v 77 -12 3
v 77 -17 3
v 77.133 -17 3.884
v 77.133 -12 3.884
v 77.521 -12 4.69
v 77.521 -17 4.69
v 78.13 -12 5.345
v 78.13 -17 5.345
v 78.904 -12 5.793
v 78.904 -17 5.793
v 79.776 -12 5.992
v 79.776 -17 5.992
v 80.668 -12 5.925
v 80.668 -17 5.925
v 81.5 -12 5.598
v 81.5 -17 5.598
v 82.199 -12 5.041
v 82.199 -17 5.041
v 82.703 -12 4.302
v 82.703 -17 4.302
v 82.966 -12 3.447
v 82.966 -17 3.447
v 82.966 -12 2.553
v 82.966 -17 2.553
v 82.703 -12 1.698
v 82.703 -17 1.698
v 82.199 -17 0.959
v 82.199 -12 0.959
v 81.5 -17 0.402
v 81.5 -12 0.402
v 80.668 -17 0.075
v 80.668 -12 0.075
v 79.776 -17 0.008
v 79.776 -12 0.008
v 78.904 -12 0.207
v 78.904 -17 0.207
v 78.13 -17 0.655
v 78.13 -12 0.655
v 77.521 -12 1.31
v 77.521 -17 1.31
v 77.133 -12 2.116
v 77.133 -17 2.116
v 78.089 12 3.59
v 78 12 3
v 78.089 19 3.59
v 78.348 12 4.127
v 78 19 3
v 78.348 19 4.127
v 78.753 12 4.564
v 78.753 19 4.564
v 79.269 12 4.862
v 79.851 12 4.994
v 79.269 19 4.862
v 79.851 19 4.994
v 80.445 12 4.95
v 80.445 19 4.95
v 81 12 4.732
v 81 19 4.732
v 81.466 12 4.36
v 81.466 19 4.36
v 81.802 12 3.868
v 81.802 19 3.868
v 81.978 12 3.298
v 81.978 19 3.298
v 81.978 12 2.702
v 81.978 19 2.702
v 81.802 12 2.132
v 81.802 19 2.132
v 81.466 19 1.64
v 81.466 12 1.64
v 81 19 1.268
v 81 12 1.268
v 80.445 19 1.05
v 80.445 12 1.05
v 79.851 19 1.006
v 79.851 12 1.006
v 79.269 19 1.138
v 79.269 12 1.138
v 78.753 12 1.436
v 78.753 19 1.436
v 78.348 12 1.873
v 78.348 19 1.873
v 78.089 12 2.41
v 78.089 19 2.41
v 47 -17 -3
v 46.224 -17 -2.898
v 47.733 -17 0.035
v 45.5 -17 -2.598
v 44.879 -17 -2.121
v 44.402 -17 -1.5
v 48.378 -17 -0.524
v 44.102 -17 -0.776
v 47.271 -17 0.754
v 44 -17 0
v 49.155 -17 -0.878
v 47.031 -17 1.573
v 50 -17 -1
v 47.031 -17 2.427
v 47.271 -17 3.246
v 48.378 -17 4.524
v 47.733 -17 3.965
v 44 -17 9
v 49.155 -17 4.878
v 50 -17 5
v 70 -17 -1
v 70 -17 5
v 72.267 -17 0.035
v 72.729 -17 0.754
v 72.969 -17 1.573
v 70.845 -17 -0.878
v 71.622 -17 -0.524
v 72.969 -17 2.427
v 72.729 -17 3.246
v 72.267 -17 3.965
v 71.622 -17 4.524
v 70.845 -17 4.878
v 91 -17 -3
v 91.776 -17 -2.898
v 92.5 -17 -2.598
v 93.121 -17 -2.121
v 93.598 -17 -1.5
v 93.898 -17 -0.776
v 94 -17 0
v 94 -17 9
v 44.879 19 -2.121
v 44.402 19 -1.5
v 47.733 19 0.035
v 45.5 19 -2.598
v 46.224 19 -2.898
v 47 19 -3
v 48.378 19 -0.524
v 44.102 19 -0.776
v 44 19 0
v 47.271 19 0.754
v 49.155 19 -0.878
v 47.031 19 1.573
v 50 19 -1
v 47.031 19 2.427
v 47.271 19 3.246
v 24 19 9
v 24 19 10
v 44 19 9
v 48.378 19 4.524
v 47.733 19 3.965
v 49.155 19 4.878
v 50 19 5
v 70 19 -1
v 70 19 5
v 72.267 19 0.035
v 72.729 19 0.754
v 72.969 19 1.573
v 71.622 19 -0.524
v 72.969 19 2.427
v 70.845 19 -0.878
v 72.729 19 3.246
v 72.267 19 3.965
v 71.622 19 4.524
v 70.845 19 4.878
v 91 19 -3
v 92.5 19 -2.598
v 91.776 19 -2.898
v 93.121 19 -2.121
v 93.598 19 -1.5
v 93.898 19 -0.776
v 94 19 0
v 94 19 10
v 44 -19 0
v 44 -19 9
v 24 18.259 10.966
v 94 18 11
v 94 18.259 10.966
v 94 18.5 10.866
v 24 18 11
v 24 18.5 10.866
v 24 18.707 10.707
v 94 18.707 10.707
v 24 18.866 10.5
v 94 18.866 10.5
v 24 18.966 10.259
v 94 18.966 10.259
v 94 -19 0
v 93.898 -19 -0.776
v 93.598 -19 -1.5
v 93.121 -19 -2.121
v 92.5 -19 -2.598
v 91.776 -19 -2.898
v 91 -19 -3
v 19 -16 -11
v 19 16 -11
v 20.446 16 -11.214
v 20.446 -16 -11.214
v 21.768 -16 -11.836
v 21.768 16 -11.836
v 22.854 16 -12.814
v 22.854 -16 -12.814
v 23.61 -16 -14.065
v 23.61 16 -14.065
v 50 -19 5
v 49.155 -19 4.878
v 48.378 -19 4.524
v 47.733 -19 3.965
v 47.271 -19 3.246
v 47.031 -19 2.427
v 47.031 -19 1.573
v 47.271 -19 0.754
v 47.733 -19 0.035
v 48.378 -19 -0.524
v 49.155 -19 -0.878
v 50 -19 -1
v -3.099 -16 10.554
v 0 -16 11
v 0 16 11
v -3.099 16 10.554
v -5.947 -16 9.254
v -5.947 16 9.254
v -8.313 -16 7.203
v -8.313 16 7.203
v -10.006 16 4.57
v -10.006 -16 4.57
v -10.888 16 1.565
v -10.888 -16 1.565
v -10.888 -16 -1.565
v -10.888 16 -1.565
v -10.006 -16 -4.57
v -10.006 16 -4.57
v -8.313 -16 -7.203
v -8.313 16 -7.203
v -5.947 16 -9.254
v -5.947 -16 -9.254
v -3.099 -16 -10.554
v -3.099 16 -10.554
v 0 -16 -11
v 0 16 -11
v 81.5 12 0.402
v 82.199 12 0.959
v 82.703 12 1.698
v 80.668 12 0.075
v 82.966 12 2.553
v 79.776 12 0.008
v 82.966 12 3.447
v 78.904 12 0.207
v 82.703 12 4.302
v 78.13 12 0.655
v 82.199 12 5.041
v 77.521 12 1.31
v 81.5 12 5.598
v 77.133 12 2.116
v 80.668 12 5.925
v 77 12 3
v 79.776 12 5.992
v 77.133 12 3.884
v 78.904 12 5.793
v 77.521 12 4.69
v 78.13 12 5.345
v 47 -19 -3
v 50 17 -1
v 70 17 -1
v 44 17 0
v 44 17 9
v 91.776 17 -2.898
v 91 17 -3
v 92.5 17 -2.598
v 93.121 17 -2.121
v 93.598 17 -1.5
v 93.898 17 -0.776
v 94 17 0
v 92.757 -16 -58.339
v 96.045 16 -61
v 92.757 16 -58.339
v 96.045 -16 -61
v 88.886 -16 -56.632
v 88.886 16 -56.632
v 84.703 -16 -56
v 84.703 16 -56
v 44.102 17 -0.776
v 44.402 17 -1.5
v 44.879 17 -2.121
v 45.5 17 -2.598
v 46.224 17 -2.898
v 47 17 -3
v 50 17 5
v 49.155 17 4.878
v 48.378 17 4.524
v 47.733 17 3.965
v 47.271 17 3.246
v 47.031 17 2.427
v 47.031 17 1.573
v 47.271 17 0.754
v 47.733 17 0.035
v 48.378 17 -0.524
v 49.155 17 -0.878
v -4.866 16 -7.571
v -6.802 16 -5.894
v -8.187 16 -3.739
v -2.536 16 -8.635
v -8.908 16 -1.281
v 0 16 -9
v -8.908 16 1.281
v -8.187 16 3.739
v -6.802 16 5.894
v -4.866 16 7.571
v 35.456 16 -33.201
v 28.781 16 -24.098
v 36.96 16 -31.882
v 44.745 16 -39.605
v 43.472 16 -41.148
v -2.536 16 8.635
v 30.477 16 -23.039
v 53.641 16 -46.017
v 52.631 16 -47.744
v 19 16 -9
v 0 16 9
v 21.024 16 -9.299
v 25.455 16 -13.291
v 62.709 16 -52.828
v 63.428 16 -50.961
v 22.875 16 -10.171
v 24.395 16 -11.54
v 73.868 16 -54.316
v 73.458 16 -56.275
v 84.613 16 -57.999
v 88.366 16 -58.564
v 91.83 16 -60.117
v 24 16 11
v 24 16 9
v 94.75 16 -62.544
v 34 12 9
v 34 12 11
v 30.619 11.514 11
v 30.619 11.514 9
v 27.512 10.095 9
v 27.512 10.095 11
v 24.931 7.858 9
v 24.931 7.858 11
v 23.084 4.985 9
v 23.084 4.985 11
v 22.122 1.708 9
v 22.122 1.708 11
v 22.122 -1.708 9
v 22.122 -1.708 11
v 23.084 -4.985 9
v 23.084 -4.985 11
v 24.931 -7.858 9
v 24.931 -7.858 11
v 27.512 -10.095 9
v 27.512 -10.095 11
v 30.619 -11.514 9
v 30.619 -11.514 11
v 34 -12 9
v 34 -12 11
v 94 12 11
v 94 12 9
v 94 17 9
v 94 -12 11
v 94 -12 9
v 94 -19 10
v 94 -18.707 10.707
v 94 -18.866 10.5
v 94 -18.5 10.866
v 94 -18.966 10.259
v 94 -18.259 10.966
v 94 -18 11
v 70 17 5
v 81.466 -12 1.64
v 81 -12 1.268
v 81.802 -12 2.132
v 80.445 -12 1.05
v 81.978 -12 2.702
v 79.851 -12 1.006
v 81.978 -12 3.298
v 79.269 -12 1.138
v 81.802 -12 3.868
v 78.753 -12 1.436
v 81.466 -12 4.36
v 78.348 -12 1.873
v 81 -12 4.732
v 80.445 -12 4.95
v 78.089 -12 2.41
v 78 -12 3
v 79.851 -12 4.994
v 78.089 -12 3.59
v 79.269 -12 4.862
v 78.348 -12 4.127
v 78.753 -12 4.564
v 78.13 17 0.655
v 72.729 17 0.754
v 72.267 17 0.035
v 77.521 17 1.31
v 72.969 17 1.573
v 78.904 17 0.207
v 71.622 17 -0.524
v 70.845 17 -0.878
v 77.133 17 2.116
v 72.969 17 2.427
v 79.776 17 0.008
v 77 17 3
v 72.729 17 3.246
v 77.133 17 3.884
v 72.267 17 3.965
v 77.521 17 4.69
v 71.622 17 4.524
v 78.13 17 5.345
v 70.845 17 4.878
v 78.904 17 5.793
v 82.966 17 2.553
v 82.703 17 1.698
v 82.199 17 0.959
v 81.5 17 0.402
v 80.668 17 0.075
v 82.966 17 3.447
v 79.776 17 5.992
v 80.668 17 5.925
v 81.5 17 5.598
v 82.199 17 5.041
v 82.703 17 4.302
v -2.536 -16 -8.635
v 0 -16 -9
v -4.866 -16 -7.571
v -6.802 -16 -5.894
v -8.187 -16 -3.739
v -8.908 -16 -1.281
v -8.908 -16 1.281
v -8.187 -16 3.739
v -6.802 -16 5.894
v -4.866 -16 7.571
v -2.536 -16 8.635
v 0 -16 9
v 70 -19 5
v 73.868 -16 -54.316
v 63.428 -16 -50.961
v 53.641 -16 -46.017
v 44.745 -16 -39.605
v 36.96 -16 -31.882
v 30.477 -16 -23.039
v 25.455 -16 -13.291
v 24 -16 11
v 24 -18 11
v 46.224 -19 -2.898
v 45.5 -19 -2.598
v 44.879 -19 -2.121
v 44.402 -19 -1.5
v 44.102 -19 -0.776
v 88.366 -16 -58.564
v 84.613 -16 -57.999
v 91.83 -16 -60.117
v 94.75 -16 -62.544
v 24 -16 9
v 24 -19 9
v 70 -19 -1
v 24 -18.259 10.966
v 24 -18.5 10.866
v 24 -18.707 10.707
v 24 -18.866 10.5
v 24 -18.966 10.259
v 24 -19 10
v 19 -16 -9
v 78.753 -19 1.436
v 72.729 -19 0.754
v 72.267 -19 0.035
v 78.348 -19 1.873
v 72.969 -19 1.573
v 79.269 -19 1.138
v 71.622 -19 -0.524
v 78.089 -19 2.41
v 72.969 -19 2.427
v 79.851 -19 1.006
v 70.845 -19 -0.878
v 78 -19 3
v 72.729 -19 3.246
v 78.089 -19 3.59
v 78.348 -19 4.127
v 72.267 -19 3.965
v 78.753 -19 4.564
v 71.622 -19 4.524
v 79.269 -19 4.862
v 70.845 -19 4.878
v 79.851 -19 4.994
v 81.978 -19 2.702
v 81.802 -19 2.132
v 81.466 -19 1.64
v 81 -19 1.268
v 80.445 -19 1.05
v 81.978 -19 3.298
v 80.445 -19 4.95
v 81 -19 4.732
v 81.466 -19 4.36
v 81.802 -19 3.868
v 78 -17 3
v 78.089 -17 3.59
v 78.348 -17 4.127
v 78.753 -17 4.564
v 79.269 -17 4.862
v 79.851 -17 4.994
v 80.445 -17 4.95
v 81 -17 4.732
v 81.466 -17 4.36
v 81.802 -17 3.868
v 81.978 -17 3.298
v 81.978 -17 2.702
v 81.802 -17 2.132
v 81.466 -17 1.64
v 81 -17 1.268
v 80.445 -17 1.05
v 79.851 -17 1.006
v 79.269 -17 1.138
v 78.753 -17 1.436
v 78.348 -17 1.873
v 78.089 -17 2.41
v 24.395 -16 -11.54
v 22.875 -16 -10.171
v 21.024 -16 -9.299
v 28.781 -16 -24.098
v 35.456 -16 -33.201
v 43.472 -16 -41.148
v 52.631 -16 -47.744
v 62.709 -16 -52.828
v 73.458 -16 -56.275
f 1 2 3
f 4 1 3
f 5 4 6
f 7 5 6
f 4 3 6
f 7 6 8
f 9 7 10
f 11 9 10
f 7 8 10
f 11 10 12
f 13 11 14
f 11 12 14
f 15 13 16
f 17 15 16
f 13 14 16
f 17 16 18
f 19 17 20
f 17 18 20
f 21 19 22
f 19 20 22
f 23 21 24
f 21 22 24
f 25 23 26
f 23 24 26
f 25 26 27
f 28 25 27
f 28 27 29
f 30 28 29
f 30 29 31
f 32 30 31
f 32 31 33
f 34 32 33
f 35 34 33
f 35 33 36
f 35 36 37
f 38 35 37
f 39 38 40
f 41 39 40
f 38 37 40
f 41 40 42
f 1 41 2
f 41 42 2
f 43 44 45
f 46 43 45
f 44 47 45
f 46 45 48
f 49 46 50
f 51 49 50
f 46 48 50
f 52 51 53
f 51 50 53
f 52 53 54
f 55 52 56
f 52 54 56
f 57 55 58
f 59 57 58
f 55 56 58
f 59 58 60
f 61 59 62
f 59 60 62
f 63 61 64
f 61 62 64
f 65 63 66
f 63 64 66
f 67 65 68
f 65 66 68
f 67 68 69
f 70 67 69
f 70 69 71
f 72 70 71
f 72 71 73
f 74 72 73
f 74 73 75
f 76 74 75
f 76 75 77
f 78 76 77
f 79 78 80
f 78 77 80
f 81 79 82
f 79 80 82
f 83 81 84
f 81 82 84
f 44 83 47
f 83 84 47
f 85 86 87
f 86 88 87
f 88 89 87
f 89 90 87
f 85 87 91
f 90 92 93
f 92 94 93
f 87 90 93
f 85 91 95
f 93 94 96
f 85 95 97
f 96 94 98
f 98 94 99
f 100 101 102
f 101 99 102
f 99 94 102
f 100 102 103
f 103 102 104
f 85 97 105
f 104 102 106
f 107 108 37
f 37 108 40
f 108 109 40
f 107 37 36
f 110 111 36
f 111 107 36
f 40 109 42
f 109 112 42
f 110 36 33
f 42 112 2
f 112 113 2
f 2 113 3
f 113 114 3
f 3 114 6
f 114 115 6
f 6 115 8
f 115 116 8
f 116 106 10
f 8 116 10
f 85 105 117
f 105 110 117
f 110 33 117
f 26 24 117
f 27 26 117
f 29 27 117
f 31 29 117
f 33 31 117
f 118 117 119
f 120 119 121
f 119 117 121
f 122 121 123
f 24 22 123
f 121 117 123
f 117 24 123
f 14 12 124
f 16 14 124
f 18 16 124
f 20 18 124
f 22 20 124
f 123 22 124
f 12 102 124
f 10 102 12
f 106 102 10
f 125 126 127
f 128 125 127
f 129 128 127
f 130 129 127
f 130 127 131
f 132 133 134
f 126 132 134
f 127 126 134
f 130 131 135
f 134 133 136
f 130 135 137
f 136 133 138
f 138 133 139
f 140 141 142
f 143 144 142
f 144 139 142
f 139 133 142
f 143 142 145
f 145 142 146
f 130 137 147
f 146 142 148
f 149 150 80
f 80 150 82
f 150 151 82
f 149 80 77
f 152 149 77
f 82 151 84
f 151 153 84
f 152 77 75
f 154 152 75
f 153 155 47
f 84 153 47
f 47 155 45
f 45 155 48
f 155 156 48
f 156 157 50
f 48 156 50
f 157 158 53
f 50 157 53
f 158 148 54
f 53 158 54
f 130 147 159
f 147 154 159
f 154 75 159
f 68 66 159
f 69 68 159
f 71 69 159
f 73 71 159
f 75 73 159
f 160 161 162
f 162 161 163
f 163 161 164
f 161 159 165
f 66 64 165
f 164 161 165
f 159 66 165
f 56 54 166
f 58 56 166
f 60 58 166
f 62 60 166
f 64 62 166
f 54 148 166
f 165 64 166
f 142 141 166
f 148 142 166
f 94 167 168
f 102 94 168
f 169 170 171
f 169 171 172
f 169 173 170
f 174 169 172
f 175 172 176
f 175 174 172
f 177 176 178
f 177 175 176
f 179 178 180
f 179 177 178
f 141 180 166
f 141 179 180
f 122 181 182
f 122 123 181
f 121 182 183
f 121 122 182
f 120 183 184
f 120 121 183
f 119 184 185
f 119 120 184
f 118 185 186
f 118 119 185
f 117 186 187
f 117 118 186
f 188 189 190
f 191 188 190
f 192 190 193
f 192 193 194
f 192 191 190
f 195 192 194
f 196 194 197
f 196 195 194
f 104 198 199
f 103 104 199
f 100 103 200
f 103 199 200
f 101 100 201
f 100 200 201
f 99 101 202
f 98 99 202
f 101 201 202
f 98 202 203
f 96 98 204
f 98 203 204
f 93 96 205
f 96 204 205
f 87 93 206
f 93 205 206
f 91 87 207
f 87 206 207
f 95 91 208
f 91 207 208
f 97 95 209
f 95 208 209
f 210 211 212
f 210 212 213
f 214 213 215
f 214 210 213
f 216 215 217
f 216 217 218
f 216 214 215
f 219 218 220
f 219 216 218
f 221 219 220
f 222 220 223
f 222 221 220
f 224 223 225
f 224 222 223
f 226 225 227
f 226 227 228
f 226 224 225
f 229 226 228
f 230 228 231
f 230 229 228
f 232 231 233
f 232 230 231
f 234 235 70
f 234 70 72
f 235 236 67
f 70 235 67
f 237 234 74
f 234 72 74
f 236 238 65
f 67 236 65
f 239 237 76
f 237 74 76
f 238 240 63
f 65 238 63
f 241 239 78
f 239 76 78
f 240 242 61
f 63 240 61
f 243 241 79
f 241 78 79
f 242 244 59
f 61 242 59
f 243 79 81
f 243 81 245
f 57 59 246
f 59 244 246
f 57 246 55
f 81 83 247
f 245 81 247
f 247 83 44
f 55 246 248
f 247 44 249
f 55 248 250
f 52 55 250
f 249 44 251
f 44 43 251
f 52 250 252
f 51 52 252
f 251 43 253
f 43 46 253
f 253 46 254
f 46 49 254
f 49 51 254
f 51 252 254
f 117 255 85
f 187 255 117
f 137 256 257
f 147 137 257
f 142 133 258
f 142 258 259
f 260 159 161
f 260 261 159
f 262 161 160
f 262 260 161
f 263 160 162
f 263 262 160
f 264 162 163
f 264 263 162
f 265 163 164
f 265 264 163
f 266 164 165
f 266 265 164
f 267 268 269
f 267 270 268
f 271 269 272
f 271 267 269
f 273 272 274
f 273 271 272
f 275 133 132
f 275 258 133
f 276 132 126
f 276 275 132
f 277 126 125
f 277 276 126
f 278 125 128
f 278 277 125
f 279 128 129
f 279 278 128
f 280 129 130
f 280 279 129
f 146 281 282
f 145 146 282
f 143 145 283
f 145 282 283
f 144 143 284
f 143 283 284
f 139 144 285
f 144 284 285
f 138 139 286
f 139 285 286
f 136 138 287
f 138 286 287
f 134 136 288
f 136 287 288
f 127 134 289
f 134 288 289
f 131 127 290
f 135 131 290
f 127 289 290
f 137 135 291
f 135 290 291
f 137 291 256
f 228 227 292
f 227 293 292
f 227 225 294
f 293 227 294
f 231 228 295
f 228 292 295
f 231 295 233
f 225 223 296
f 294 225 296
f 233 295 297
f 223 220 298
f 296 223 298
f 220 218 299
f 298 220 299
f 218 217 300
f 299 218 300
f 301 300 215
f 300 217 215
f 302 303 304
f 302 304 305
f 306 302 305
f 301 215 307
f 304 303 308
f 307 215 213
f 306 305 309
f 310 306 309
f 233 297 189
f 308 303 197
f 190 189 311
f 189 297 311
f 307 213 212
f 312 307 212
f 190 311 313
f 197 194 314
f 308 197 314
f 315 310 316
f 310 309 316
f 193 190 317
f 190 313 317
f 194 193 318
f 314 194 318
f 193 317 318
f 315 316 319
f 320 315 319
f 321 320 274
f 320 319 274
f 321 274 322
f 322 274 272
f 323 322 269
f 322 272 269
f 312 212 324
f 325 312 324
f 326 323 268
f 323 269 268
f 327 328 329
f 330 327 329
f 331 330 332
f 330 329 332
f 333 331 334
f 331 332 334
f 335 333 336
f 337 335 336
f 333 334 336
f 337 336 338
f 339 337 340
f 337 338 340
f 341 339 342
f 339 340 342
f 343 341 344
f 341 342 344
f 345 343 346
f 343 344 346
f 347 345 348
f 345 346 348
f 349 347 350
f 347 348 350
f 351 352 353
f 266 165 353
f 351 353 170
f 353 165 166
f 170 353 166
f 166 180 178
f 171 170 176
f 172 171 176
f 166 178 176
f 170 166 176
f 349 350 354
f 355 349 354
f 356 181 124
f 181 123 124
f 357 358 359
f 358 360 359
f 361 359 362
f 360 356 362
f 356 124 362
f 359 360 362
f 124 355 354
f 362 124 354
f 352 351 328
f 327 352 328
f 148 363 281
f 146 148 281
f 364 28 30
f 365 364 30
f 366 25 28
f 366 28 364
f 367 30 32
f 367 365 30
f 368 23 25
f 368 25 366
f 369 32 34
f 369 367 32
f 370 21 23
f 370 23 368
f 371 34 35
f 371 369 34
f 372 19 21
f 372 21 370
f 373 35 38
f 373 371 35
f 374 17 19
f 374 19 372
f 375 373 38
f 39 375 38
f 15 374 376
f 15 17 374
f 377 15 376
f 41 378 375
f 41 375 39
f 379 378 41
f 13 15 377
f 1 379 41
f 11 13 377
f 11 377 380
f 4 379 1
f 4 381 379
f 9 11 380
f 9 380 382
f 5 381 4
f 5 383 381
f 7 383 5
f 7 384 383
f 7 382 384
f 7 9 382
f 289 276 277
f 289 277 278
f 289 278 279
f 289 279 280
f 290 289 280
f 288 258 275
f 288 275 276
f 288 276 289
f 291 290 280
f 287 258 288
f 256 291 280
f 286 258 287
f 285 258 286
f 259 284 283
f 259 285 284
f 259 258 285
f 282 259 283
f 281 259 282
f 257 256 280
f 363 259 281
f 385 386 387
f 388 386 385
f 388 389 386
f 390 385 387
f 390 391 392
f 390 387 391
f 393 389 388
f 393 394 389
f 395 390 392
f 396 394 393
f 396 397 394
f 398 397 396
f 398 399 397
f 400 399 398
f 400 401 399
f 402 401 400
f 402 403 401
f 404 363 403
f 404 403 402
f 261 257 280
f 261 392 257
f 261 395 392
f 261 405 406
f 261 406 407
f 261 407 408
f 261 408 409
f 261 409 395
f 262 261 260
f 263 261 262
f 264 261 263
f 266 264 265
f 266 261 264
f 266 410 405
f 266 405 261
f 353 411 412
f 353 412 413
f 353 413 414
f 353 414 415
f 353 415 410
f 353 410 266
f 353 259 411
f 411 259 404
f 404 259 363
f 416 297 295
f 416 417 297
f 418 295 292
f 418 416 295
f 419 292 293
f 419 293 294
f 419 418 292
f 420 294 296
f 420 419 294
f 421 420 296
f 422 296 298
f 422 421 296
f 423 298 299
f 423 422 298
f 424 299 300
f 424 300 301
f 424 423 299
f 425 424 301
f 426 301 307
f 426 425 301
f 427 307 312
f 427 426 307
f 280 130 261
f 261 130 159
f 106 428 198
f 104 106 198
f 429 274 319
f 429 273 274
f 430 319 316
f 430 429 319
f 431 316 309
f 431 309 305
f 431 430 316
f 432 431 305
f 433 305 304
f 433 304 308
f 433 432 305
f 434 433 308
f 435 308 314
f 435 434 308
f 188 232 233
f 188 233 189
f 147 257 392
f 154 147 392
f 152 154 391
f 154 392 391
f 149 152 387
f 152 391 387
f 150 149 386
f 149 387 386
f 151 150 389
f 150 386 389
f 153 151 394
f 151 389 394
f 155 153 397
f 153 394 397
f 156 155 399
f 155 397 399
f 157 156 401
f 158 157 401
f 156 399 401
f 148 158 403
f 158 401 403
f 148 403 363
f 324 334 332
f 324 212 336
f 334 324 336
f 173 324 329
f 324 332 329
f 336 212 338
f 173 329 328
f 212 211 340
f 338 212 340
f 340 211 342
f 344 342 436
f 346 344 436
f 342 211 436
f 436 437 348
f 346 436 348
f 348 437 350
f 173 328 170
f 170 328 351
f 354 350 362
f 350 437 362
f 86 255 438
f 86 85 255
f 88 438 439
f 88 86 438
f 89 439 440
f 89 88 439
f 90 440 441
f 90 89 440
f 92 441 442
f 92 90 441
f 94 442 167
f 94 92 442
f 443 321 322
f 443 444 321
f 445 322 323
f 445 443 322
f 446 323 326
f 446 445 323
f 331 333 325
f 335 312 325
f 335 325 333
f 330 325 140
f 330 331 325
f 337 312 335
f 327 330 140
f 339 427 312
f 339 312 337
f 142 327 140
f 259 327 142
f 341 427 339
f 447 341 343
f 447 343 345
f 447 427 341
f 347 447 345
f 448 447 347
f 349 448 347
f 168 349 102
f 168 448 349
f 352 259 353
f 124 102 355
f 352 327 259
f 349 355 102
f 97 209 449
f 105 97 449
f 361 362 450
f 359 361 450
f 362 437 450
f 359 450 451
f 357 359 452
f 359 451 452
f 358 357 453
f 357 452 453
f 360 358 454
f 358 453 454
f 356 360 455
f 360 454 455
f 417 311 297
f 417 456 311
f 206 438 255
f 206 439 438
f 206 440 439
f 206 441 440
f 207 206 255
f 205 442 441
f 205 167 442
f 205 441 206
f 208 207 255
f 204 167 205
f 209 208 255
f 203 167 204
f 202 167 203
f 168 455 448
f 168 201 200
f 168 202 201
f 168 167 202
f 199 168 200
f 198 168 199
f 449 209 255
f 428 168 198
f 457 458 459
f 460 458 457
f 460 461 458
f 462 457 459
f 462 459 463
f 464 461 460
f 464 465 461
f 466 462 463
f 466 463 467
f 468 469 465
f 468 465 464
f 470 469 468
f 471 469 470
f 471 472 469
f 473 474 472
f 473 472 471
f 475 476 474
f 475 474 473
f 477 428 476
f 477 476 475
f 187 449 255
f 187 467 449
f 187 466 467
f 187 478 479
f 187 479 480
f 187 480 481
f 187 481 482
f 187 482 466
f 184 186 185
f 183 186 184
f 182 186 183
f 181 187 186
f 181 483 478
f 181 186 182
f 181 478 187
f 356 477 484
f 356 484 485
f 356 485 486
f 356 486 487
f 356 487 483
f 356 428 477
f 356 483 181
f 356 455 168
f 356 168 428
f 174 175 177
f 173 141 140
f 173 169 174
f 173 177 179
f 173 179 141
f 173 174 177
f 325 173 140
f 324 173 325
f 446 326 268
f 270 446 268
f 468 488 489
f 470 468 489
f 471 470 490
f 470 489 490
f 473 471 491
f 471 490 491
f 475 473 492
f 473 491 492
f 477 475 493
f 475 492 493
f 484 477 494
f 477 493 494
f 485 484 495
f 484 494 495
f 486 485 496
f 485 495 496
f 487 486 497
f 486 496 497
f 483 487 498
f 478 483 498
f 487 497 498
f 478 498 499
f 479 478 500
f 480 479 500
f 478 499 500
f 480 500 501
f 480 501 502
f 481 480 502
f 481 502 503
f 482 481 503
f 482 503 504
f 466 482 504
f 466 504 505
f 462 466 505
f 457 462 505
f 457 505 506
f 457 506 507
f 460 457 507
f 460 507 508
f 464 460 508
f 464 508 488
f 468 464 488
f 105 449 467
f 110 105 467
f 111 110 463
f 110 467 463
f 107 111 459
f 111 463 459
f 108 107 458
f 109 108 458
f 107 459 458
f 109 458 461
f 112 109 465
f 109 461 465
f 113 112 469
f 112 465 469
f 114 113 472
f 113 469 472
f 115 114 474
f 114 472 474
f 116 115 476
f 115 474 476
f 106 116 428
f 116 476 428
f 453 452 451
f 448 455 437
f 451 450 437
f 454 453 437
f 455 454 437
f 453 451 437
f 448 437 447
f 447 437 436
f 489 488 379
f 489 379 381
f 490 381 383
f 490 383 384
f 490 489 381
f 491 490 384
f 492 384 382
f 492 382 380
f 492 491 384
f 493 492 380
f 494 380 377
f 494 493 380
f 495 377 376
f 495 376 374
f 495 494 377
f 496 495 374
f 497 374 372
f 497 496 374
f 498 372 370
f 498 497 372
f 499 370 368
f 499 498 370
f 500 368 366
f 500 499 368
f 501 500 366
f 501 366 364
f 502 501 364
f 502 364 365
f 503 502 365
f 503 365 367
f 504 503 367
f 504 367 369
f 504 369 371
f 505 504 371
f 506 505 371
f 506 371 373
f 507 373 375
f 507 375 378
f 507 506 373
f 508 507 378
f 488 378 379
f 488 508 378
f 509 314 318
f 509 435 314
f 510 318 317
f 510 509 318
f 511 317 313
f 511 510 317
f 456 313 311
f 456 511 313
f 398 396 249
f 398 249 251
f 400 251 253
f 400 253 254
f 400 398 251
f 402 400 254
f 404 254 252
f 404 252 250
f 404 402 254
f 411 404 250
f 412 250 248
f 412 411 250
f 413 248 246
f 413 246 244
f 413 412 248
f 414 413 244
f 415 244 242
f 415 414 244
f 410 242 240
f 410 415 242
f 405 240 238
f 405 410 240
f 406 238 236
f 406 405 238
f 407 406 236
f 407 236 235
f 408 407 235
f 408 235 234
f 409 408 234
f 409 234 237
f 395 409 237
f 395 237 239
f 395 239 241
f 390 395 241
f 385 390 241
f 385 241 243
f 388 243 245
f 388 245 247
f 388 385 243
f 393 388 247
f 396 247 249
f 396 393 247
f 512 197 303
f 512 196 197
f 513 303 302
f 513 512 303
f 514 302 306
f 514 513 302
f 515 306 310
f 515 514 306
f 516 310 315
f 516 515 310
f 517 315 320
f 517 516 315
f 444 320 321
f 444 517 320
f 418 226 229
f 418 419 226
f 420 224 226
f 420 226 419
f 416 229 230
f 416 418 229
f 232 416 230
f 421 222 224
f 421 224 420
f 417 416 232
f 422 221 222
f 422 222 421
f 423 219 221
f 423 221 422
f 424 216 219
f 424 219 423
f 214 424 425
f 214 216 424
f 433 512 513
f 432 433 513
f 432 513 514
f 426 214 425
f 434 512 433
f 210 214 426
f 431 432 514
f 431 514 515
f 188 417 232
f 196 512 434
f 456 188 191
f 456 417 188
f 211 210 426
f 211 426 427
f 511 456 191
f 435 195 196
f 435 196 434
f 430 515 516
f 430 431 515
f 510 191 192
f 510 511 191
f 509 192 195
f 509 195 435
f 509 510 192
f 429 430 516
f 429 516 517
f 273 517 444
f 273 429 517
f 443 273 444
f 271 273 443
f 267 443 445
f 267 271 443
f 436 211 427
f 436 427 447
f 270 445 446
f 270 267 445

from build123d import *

# Parameters (mm, degrees)
F1_DEPTH  = 16
F2_W      = 70
F2_H      = 3
F3_DEPTH  = 2
F4_W      = 50
F4_H      = 14
F5_DEPTH  = 2
F6_R      = 1
F9_DEPTH  = 2
F11_DEPTH = 38.001
F13_D     = 4
F14_R     = 3
F14_R_2   = 2
F15_DEPTH = 5
F16_R     = 3


# Not quite as in the source:
# - a pattern or mirror of a feature is missing from the dataset's text; its kind, count and spacing are read off the source's solid


with BuildPart() as f1:
    # F0 (on Front) → F1 (new body)
    with BuildSketch(Plane.XZ):
        with BuildLine():
            Line((94, 11), (0, 11))
            ThreePointArc((0, 11), (-11, 0), (0, -11))
            Line((0, -11), (19, -11))
            ThreePointArc((19, -11), (21.7681124643, -11.8361612201), (23.6103896104, -14.064978646))
            ThreePointArc((23.6103896104, -14.064978646), (47.9223026847, -44.6255578719), (84.6125434697, -57.9988278946))
            ThreePointArc((84.6125434697, -57.9988278946), (90.1511361286, -59.2227601314), (94.7495356371, -62.543714922))
            Line((94.7495356371, -62.543714922), (96.0448662588, -61))
            ThreePointArc((96.0448662588, -61), (90.8779784788, -57.357163598), (84.7034264019, -56))
            ThreePointArc((84.7034264019, -56), (49.0672193413, -42.9854179344), (25.4545454545, -13.2909701044))
            ThreePointArc((25.4545454545, -13.2909701044), (22.87535745, -10.1706257081), (19, -9))
            Line((19, -9), (0, -9))
            ThreePointArc((0, -9), (-9, 0), (0, 9))
            Line((0, 9), (94, 9))
            Line((94, 9), (94, 11))
        make_face()
    extrude(amount=F1_DEPTH)

    # F2 (on face) → F3 (join)
    with BuildSketch(Plane.XY.offset(11)):
        with Locations((59, -17.5)):
            Rectangle(F2_W, F2_H)
    extrude(amount=-F3_DEPTH)

    # F4 (on face) → F5 (join)
    with BuildSketch(Plane.XZ.offset(19)):
        with Locations((69, 4)):
            Rectangle(F4_W, F4_H)
    extrude(amount=-F5_DEPTH)

    # F6
    f6_edges = [f1.edges().sort_by_distance(p)[0] for p in [
        (59, -19, 11),
    ]]
    fillet(f6_edges, radius=F6_R)

    # F7: F1 across plane


with BuildPart() as f1_1:
    add(f1.part)
    add(f1.part.mirror(Plane.XZ))

    # F8 (on face) → F9 (cut)
    with BuildSketch(Plane.XY.offset(11)):
        with BuildLine():
            Line((94, 12), (34, 12))
            ThreePointArc((34, 12), (22, 0), (34, -12))
            Line((34, -12), (94, -12))
            Line((94, -12), (94, 12))
        make_face()
    extrude(amount=-F9_DEPTH, mode=Mode.SUBTRACT)

    # F10 (on face) → F11 (cut, through all)
    with BuildSketch(Plane.XZ.offset(19)):
        with BuildLine():
            ThreePointArc((50, 5), (47, 2), (50, -1))
            Line((50, -1), (70, -1))
            ThreePointArc((70, -1), (73, 2), (70, 5))
            Line((70, 5), (50, 5))
        make_face()
    extrude(amount=-F11_DEPTH, mode=Mode.SUBTRACT)

    # F13 (through all)
    with Locations(Plane.XZ.offset(19)):
        with Locations((80, 3)):
            Hole(F13_D / 2)

    # F14 (on face) → F15 (join)
    with BuildSketch(Plane(origin=(0, -17, 0), x_dir=(-1, 0, 0), z_dir=(0, 1, 0))):
        with Locations((-80, 3)):
            Circle(F14_R)
        with Locations((-80, 3)):
            Circle(F14_R_2, mode=Mode.SUBTRACT)
    f15 = extrude(amount=F15_DEPTH)

    # F15_copies: F15 across plane
    add(f15.mirror(Plane.ZX))

    # F16
    f16_edges = [f1_1.edges().sort_by_distance(p)[0] for p in [
        (94, 18, -3),
        (44, 18, -3),
        (44, -18, -3),
        (94, -18, -3),
    ]]
    fillet(f16_edges, radius=F16_R)


solid = f1_1.part
